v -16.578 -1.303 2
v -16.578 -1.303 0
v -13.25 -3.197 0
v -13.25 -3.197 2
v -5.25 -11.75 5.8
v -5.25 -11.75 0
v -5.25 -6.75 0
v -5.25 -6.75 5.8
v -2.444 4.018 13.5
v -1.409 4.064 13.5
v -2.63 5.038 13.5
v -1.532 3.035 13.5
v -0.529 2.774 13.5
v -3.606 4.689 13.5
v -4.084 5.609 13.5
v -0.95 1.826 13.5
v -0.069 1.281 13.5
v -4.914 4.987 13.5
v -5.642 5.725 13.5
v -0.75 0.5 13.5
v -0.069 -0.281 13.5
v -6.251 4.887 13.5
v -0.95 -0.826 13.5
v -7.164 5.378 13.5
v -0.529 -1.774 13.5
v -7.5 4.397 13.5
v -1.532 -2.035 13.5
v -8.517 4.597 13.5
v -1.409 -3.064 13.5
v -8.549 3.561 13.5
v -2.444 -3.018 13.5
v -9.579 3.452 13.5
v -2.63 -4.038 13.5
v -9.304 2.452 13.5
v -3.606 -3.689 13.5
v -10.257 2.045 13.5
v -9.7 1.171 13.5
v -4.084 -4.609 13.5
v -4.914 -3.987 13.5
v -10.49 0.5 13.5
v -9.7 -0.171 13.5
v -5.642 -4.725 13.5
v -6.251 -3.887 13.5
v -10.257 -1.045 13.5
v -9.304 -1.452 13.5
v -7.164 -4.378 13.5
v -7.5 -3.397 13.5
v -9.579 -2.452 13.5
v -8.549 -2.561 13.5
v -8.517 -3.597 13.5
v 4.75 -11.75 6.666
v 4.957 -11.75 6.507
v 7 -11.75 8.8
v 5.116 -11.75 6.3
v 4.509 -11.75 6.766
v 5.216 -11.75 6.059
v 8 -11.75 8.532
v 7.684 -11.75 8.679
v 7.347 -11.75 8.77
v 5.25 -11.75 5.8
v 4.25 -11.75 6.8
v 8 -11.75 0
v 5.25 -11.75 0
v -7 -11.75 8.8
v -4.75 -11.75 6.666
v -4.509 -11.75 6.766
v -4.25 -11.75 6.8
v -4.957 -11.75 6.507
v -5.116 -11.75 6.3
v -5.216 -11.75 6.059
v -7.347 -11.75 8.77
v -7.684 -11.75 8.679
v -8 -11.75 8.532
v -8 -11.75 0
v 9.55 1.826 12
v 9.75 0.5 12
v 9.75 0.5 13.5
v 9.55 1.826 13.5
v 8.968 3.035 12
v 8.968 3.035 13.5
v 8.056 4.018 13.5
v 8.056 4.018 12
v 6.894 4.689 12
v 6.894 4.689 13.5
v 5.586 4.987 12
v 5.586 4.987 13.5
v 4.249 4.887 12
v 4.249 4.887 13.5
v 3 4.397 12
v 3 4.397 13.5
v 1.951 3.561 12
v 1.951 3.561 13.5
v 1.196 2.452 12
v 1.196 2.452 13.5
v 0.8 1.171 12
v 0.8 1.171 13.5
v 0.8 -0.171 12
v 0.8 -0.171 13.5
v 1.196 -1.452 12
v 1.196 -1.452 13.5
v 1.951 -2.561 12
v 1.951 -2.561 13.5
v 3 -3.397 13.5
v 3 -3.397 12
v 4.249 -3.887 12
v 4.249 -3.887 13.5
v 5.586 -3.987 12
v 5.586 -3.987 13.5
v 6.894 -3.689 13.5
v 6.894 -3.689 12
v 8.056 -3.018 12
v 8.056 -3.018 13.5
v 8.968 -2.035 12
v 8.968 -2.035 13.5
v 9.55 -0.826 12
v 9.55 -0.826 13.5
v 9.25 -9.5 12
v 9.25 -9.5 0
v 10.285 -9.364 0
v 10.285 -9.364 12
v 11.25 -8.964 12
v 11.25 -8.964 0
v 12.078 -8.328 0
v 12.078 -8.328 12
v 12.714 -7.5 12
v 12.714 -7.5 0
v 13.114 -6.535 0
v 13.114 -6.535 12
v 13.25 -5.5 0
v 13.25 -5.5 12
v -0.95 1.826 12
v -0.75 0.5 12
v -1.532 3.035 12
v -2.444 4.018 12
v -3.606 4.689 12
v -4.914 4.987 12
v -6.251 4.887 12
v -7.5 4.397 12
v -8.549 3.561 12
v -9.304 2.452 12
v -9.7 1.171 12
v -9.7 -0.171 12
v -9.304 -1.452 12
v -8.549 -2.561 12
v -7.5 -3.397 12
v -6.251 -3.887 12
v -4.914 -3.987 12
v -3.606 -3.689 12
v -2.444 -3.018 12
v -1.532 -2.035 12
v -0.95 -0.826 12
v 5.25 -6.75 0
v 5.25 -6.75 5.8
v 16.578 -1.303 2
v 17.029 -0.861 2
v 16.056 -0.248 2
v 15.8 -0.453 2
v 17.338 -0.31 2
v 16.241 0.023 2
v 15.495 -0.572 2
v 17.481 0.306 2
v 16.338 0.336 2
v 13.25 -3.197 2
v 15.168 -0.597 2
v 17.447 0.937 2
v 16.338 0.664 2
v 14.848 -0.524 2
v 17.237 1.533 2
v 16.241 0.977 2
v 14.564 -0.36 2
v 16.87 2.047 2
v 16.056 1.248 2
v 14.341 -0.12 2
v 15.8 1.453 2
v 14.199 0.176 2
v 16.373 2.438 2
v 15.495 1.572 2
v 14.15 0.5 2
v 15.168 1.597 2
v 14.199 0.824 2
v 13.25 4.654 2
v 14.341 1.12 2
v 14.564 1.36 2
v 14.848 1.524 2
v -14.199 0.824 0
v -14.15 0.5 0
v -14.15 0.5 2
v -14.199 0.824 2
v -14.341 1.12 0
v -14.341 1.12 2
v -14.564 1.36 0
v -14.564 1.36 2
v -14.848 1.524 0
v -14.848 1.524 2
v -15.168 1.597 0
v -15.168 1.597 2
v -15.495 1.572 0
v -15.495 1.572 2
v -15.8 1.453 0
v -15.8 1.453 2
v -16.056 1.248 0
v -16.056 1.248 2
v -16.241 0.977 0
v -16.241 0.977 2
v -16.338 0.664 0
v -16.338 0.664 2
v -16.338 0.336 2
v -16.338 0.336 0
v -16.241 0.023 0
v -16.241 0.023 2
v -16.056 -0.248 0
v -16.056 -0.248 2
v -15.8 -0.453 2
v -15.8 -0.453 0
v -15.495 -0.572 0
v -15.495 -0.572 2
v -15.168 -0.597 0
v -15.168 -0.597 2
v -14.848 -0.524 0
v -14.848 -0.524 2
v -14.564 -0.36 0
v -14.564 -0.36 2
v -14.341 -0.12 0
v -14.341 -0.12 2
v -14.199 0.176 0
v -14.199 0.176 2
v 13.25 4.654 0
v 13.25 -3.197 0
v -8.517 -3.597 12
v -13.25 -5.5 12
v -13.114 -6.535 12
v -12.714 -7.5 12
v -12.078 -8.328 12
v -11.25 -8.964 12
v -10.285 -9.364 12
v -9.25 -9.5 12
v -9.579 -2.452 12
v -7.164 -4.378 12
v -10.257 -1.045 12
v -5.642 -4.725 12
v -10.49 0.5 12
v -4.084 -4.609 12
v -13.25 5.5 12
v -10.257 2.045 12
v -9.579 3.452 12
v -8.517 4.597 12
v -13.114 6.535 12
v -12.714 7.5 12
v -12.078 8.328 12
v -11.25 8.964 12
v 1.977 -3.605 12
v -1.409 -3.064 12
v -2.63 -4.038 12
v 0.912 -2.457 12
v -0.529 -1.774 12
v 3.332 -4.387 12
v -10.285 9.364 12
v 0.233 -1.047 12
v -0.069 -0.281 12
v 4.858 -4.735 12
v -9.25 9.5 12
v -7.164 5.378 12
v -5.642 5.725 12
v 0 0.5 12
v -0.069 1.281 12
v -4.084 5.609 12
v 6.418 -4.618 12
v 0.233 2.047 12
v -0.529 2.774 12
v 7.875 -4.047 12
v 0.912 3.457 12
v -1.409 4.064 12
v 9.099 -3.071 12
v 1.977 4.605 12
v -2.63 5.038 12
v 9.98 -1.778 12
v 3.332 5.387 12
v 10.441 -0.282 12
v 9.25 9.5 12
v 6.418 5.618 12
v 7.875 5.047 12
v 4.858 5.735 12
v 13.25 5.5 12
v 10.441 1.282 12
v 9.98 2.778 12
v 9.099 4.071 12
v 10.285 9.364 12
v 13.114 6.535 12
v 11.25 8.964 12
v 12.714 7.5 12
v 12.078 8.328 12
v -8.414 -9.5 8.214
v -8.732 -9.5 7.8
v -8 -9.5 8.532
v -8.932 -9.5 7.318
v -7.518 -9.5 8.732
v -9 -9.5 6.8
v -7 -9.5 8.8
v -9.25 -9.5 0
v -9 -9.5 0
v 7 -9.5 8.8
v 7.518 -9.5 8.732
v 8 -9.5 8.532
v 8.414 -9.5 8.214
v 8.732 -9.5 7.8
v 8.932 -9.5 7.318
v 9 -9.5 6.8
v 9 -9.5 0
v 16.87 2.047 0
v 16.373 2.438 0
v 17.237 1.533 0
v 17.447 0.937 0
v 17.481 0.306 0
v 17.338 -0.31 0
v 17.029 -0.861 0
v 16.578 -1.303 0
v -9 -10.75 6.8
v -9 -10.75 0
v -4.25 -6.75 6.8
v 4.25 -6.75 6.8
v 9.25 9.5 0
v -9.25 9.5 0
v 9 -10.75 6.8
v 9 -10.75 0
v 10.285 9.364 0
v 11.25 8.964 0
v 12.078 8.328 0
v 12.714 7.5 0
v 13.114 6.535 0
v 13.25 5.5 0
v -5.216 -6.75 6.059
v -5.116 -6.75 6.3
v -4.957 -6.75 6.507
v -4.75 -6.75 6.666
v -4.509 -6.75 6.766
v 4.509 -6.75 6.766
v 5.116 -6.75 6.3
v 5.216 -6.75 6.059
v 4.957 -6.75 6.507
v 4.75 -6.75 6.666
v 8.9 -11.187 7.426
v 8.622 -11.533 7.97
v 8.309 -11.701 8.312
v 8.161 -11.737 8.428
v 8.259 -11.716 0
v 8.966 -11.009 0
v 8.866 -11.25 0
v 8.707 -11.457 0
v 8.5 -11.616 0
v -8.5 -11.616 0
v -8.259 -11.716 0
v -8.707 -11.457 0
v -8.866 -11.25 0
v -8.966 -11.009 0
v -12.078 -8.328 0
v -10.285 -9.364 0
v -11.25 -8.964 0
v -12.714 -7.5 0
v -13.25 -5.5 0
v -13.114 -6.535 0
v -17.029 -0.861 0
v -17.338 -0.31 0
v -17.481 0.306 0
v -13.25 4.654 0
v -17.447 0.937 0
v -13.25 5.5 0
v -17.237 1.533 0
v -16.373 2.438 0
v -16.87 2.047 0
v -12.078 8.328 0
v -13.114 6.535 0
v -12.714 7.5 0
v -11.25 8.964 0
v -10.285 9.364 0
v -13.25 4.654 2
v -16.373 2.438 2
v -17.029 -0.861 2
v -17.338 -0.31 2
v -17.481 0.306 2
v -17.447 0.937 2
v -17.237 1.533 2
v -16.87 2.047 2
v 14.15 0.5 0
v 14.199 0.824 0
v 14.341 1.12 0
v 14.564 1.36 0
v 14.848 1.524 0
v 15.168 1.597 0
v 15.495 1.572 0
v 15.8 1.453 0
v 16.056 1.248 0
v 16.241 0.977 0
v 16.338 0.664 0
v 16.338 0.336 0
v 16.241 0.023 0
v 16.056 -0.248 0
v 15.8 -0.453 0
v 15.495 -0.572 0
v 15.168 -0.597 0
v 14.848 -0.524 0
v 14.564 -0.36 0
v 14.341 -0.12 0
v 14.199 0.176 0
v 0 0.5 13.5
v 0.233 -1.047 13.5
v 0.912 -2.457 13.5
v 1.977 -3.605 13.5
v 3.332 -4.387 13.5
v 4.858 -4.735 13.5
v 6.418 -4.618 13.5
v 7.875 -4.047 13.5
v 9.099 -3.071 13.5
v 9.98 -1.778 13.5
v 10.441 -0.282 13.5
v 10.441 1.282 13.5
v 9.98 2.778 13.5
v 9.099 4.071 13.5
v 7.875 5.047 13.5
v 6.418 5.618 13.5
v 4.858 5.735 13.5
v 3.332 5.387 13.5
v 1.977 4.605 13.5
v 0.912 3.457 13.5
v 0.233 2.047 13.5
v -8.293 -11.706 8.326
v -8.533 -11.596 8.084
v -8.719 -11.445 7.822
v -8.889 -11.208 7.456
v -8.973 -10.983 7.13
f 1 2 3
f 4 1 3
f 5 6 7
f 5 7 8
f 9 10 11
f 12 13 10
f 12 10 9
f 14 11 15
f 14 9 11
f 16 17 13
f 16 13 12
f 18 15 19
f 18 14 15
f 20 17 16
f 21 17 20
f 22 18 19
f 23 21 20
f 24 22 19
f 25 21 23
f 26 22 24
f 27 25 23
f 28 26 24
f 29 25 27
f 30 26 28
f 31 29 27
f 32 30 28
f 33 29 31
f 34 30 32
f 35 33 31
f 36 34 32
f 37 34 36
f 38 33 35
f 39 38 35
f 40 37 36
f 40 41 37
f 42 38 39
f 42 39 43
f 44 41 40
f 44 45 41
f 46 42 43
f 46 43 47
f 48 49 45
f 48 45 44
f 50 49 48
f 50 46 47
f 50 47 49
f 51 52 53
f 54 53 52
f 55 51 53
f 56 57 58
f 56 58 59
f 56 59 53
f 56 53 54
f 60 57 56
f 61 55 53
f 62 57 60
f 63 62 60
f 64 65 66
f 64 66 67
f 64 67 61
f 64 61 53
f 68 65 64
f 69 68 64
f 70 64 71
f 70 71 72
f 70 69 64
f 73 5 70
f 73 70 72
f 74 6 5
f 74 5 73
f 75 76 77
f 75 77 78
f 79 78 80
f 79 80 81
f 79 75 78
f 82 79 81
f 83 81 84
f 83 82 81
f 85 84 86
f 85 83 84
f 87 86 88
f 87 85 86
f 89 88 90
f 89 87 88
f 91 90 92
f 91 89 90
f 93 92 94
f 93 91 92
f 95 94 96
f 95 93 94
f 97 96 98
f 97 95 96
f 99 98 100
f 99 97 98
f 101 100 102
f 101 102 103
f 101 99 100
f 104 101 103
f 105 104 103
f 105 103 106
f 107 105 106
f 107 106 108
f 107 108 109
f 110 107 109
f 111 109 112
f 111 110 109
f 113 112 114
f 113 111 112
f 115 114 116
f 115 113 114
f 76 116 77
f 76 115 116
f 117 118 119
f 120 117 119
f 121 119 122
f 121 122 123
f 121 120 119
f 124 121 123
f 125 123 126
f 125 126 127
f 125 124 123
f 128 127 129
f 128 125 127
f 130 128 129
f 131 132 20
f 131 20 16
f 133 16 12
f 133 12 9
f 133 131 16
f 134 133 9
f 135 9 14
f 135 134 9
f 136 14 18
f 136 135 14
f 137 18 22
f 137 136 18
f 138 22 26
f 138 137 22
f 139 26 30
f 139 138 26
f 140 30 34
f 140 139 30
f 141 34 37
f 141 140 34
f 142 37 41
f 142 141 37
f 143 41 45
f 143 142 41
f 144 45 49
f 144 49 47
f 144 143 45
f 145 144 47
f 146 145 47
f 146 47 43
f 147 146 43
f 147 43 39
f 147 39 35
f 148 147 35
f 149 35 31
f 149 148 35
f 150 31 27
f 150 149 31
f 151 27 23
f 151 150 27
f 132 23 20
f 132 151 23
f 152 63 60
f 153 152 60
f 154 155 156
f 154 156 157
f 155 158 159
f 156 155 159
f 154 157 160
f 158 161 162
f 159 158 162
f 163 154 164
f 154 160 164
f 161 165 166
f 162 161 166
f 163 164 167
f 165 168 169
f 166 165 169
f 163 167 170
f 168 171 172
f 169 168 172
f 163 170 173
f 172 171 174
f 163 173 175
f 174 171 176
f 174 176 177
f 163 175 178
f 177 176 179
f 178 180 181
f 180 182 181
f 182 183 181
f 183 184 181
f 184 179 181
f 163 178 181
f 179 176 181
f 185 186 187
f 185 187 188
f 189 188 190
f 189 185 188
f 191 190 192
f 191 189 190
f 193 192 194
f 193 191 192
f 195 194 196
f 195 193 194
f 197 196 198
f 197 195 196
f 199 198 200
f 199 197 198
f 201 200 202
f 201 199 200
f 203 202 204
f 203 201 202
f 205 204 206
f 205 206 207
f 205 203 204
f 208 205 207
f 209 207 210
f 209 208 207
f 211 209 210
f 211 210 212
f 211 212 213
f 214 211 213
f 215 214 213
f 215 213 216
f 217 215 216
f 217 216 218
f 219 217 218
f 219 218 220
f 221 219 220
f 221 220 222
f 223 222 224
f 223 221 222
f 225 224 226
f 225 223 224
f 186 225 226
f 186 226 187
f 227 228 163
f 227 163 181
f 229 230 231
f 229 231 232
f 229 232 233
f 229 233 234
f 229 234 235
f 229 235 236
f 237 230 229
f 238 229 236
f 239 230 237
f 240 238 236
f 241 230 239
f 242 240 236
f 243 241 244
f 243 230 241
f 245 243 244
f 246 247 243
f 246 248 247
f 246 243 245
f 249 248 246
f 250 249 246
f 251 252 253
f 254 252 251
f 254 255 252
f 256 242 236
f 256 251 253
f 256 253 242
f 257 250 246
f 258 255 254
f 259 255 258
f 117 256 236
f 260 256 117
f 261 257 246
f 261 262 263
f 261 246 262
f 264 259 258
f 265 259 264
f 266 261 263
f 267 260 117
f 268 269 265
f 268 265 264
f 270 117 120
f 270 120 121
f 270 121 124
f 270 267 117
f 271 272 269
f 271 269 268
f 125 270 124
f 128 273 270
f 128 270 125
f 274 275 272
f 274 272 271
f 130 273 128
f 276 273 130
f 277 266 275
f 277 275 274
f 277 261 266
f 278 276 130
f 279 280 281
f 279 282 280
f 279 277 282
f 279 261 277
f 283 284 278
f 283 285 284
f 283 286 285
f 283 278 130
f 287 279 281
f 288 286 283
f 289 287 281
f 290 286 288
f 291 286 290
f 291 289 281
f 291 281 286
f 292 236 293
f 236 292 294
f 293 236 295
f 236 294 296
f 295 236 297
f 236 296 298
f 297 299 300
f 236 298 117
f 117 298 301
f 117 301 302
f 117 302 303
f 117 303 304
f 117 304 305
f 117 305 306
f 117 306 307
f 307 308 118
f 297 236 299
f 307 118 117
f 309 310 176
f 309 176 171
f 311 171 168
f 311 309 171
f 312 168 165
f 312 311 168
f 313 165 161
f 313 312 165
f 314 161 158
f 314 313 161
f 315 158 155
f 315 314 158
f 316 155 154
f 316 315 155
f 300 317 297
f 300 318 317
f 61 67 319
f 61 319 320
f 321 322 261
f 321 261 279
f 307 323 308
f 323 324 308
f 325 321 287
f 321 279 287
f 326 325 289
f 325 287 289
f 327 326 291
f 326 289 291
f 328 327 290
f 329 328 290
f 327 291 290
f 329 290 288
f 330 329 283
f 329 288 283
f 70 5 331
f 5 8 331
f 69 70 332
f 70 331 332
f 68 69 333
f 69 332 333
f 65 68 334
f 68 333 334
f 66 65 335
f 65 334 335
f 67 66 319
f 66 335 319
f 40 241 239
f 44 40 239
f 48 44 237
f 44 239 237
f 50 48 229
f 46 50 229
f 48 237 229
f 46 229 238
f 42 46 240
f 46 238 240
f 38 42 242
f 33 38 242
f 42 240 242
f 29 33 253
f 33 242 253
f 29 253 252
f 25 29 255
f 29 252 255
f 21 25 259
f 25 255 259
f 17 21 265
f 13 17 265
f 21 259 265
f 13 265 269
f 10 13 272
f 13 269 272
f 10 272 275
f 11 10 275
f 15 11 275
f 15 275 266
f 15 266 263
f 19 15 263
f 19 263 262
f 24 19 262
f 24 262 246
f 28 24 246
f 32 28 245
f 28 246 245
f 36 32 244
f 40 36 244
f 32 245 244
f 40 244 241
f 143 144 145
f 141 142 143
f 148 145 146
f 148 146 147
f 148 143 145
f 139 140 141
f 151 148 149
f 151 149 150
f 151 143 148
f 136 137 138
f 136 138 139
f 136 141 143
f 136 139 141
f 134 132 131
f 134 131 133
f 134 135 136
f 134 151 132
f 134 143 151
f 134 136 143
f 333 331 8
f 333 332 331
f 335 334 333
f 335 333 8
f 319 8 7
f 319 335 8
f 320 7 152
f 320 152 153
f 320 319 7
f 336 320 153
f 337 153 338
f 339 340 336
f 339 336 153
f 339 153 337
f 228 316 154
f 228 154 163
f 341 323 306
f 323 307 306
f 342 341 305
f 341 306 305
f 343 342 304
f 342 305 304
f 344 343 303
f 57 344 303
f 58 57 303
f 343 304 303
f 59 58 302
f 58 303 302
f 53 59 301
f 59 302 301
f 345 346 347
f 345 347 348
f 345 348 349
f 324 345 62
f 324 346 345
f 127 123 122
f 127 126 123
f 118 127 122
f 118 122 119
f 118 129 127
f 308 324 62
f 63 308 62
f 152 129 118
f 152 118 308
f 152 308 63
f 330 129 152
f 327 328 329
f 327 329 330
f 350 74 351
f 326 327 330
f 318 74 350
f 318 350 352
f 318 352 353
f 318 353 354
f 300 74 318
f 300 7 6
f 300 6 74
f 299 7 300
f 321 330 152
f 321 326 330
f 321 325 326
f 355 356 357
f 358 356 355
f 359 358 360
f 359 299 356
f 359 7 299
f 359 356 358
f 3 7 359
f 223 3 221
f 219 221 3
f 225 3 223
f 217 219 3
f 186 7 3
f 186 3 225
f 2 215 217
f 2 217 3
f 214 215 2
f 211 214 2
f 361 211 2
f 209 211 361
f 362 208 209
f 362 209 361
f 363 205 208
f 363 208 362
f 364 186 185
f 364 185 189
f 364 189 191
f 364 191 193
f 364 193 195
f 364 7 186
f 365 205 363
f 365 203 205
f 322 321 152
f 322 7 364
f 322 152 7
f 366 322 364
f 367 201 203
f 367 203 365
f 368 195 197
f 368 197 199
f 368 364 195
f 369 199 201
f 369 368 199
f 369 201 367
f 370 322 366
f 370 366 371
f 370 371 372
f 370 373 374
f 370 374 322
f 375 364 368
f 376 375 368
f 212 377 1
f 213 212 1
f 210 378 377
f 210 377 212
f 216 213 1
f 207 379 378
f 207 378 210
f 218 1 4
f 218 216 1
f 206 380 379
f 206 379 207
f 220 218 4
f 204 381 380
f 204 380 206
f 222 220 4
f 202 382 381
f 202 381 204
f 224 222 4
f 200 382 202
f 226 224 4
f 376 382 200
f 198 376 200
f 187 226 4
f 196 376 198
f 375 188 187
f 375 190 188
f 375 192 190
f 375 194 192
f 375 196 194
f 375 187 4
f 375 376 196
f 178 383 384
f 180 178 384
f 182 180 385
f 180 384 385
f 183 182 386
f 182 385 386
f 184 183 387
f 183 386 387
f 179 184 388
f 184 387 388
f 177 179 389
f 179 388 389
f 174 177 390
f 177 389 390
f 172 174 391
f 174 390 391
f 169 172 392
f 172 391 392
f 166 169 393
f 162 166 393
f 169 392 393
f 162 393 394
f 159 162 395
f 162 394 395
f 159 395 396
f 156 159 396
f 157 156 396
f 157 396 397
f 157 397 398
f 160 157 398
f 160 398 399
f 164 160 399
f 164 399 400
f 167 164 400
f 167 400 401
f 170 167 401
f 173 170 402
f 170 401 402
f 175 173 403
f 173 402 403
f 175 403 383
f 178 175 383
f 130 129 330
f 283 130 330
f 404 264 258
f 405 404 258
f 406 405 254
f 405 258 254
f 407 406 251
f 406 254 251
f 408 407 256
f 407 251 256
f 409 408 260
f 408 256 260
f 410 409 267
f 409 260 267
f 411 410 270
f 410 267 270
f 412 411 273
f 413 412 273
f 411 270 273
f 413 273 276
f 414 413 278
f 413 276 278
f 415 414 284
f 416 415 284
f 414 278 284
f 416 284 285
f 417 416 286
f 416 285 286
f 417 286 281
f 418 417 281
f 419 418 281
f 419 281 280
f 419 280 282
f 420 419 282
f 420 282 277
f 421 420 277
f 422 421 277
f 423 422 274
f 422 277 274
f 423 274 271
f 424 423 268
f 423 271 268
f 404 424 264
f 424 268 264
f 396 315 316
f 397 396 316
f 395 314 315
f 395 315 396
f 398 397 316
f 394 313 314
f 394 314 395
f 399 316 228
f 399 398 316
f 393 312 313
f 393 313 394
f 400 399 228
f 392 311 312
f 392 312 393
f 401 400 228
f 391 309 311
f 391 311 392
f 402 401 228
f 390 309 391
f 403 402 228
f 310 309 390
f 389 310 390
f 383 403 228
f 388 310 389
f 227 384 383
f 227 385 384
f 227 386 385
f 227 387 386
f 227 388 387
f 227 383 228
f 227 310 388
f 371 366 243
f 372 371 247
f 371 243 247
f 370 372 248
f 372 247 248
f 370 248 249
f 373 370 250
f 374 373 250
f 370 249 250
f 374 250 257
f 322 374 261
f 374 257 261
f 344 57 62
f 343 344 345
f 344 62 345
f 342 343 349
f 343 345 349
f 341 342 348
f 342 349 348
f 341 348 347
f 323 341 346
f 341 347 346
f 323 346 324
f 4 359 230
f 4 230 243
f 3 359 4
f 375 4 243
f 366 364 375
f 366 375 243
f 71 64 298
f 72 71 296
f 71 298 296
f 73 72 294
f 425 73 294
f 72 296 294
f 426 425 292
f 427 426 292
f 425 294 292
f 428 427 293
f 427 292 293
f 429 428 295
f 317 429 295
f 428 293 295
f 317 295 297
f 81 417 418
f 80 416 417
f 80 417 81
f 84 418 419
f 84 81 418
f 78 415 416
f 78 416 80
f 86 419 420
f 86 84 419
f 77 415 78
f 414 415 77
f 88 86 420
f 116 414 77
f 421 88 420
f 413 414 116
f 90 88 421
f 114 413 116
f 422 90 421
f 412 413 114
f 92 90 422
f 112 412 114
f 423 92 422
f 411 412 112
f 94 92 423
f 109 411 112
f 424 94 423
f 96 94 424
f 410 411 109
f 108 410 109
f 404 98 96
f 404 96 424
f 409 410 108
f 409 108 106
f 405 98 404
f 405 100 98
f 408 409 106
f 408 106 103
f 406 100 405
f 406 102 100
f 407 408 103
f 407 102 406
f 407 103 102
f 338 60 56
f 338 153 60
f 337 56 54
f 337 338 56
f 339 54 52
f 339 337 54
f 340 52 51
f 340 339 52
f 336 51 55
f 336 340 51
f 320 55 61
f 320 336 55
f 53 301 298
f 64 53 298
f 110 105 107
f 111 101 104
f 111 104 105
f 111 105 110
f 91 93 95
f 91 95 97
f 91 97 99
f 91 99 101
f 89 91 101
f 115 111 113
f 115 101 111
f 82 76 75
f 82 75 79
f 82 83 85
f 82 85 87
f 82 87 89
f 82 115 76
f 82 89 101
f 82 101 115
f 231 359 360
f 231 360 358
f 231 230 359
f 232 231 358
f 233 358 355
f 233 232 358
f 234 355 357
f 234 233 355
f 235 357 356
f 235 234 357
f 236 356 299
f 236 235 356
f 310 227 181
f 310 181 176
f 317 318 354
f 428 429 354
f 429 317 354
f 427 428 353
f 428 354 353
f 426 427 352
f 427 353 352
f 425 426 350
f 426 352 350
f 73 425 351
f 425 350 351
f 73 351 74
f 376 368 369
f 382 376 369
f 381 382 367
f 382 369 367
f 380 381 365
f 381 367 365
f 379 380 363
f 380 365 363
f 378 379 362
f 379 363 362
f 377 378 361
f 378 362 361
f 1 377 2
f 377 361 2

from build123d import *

# Parameters (mm, degrees)
SKETCH_1_W          = 26.5
SKETCH_1_H          = 19
EXTRUDE_1_DEPTH     = 12
SKETCH_2_R          = 5.25
SKETCH_2_R_2        = 4.5
EXTRUDE_6_DEPTH     = 1.5
FILLET_1_R          = 4
SKETCH_3_R          = 1.1
EXTRUDE_7_DEPTH     = 2
SKETCH_4_R          = 5.24
SKETCH_4_R_2        = 4.5
EXTRUDE_11_DEPTH    = 1.5
SKETCH_5_W          = 18
SKETCH_5_H          = 4.5
EXTRUDE_12_DEPTH    = 8.8
FILLET_2_R          = 2
FILLET_3_R          = 1
SKETCH_6_W          = 10.5
SKETCH_6_H          = 6.8
CUT_EXTRUDE_1_DEPTH = 5
FILLET_4_R          = 1


with BuildPart() as part:
    # 草图1 → 凸台-拉伸1 (new body)
    with BuildSketch(Plane.XY):
        Rectangle(SKETCH_1_W, SKETCH_1_H)
    extrude(amount=EXTRUDE_1_DEPTH)

    # 草图2 → 凸台-拉伸6 (add)
    with BuildSketch(Plane.XY.offset(12)):
        with Locations(Location((5.25, 0.5, 0), (0, 0, 180))):
            Circle(SKETCH_2_R)
        with Locations((5.25, 0.5)):
            Circle(SKETCH_2_R_2, mode=Mode.SUBTRACT)
    extrude(amount=EXTRUDE_6_DEPTH)

    # 圆角1
    fillet_1_edges = [part.edges().sort_by_distance(p)[0] for p in [
        (13.25, -9.5, 6),
        (-13.25, -9.5, 6),
        (-13.25, 9.5, 6),
        (13.25, 9.5, 6),
    ]]
    fillet(fillet_1_edges, radius=FILLET_1_R)


with BuildPart() as body_2:
    # 草图3 → 凸台-拉伸7 (new body)
    with BuildSketch(Plane(origin=(0, 0, 0), x_dir=(-1, 0, 0), z_dir=(0, 0, -1))):
        with BuildLine():
            Line((-13.25, -3.197389306), (-13.25, 0.5))
            Line((-13.25, 0.5), (-13.25, 4.65411399))
            Line((-13.25, 4.65411399), (-16.373409728, 2.437537425))
            ThreePointArc((-16.373409728, 2.437537425), (-17.486318468, 0.622394439), (-16.578150415, -1.303362738))
            Line((-16.578150415, -1.303362738), (-13.25, -3.197389306))
        make_face()
        with Locations((-15.25, 0.5)):
            Circle(SKETCH_3_R, mode=Mode.SUBTRACT)
    extrude_7 = extrude(amount=-EXTRUDE_7_DEPTH)


with BuildPart() as part_1:
    add(part.part)

    # 镜向3: 凸台-拉伸7 across plane
    add(extrude_7.mirror(Plane(origin=(0, 0, 0), x_dir=(0, 0, 1), z_dir=(1, 0, 0))))

    # 草图4 → 凸台-拉伸11 (add)
    with BuildSketch(Plane.XY.offset(12)):
        with Locations(Location((-5.25, 0.5, 0), (0, 0, 180))):
            Circle(SKETCH_4_R)
        with Locations((-5.25, 0.5)):
            Circle(SKETCH_4_R_2, mode=Mode.SUBTRACT)
    extrude(amount=EXTRUDE_11_DEPTH)

    # 草图5 → 凸台-拉伸12 (add)
    with BuildSketch(Plane(origin=(0, 0, 0), x_dir=(-1, 0, 0), z_dir=(0, 0, -1))):
        with Locations((0, -9.5)):
            Rectangle(SKETCH_5_W, SKETCH_5_H)
    extrude(amount=-EXTRUDE_12_DEPTH)

    # 圆角2
    fillet_2_edges = [part_1.edges().sort_by_distance(p)[0] for p in [
        (9, -10.625, 8.8),
        (-9, -10.625, 8.8),
    ]]
    fillet(fillet_2_edges, radius=FILLET_2_R)

    # 圆角3
    # the kernel refuses this fillet: 1 mm, written as the material it takes off along each edge
    with BuildSketch(Plane(origin=(-9, -11.75, -2.5), x_dir=(0, 1, 0), z_dir=(0, 0, 1))) as fillet_3_piece_1:
        with BuildLine():
            CenterArc((FILLET_3_R, -FILLET_3_R), FILLET_3_R, 90, 90)
            Line((0, -FILLET_3_R), (0, 0))
            Line((0, 0), (FILLET_3_R, 0))
        make_face()
    extrude(amount=11.8, mode=Mode.SUBTRACT)
    with BuildSketch(Plane(origin=(9, -11.75, -2.5), x_dir=(0, 1, 0), z_dir=(0, 0, 1))) as fillet_3_piece_2:
        with BuildLine():
            CenterArc((FILLET_3_R, FILLET_3_R), FILLET_3_R, 180, 90)
            Line((0, FILLET_3_R), (0, 0))
            Line((0, 0), (FILLET_3_R, 0))
        make_face()
    extrude(amount=11.8, mode=Mode.SUBTRACT)

    # 草图6 → 切除-拉伸1 (cut)
    with BuildSketch(Plane.XZ.offset(11.75)):
        with Locations((0, 3.4)):
            Rectangle(SKETCH_6_W, SKETCH_6_H)
    extrude(amount=-CUT_EXTRUDE_1_DEPTH, mode=Mode.SUBTRACT)

    # 圆角4
    fillet_4_edges = [part_1.edges().sort_by_distance(p)[0] for p in [
        (-5.25, -9.25, 6.8),
        (5.25, -9.25, 6.8),
    ]]
    fillet(fillet_4_edges, radius=FILLET_4_R)


solid = Compound([body_2.part, part_1.part])
